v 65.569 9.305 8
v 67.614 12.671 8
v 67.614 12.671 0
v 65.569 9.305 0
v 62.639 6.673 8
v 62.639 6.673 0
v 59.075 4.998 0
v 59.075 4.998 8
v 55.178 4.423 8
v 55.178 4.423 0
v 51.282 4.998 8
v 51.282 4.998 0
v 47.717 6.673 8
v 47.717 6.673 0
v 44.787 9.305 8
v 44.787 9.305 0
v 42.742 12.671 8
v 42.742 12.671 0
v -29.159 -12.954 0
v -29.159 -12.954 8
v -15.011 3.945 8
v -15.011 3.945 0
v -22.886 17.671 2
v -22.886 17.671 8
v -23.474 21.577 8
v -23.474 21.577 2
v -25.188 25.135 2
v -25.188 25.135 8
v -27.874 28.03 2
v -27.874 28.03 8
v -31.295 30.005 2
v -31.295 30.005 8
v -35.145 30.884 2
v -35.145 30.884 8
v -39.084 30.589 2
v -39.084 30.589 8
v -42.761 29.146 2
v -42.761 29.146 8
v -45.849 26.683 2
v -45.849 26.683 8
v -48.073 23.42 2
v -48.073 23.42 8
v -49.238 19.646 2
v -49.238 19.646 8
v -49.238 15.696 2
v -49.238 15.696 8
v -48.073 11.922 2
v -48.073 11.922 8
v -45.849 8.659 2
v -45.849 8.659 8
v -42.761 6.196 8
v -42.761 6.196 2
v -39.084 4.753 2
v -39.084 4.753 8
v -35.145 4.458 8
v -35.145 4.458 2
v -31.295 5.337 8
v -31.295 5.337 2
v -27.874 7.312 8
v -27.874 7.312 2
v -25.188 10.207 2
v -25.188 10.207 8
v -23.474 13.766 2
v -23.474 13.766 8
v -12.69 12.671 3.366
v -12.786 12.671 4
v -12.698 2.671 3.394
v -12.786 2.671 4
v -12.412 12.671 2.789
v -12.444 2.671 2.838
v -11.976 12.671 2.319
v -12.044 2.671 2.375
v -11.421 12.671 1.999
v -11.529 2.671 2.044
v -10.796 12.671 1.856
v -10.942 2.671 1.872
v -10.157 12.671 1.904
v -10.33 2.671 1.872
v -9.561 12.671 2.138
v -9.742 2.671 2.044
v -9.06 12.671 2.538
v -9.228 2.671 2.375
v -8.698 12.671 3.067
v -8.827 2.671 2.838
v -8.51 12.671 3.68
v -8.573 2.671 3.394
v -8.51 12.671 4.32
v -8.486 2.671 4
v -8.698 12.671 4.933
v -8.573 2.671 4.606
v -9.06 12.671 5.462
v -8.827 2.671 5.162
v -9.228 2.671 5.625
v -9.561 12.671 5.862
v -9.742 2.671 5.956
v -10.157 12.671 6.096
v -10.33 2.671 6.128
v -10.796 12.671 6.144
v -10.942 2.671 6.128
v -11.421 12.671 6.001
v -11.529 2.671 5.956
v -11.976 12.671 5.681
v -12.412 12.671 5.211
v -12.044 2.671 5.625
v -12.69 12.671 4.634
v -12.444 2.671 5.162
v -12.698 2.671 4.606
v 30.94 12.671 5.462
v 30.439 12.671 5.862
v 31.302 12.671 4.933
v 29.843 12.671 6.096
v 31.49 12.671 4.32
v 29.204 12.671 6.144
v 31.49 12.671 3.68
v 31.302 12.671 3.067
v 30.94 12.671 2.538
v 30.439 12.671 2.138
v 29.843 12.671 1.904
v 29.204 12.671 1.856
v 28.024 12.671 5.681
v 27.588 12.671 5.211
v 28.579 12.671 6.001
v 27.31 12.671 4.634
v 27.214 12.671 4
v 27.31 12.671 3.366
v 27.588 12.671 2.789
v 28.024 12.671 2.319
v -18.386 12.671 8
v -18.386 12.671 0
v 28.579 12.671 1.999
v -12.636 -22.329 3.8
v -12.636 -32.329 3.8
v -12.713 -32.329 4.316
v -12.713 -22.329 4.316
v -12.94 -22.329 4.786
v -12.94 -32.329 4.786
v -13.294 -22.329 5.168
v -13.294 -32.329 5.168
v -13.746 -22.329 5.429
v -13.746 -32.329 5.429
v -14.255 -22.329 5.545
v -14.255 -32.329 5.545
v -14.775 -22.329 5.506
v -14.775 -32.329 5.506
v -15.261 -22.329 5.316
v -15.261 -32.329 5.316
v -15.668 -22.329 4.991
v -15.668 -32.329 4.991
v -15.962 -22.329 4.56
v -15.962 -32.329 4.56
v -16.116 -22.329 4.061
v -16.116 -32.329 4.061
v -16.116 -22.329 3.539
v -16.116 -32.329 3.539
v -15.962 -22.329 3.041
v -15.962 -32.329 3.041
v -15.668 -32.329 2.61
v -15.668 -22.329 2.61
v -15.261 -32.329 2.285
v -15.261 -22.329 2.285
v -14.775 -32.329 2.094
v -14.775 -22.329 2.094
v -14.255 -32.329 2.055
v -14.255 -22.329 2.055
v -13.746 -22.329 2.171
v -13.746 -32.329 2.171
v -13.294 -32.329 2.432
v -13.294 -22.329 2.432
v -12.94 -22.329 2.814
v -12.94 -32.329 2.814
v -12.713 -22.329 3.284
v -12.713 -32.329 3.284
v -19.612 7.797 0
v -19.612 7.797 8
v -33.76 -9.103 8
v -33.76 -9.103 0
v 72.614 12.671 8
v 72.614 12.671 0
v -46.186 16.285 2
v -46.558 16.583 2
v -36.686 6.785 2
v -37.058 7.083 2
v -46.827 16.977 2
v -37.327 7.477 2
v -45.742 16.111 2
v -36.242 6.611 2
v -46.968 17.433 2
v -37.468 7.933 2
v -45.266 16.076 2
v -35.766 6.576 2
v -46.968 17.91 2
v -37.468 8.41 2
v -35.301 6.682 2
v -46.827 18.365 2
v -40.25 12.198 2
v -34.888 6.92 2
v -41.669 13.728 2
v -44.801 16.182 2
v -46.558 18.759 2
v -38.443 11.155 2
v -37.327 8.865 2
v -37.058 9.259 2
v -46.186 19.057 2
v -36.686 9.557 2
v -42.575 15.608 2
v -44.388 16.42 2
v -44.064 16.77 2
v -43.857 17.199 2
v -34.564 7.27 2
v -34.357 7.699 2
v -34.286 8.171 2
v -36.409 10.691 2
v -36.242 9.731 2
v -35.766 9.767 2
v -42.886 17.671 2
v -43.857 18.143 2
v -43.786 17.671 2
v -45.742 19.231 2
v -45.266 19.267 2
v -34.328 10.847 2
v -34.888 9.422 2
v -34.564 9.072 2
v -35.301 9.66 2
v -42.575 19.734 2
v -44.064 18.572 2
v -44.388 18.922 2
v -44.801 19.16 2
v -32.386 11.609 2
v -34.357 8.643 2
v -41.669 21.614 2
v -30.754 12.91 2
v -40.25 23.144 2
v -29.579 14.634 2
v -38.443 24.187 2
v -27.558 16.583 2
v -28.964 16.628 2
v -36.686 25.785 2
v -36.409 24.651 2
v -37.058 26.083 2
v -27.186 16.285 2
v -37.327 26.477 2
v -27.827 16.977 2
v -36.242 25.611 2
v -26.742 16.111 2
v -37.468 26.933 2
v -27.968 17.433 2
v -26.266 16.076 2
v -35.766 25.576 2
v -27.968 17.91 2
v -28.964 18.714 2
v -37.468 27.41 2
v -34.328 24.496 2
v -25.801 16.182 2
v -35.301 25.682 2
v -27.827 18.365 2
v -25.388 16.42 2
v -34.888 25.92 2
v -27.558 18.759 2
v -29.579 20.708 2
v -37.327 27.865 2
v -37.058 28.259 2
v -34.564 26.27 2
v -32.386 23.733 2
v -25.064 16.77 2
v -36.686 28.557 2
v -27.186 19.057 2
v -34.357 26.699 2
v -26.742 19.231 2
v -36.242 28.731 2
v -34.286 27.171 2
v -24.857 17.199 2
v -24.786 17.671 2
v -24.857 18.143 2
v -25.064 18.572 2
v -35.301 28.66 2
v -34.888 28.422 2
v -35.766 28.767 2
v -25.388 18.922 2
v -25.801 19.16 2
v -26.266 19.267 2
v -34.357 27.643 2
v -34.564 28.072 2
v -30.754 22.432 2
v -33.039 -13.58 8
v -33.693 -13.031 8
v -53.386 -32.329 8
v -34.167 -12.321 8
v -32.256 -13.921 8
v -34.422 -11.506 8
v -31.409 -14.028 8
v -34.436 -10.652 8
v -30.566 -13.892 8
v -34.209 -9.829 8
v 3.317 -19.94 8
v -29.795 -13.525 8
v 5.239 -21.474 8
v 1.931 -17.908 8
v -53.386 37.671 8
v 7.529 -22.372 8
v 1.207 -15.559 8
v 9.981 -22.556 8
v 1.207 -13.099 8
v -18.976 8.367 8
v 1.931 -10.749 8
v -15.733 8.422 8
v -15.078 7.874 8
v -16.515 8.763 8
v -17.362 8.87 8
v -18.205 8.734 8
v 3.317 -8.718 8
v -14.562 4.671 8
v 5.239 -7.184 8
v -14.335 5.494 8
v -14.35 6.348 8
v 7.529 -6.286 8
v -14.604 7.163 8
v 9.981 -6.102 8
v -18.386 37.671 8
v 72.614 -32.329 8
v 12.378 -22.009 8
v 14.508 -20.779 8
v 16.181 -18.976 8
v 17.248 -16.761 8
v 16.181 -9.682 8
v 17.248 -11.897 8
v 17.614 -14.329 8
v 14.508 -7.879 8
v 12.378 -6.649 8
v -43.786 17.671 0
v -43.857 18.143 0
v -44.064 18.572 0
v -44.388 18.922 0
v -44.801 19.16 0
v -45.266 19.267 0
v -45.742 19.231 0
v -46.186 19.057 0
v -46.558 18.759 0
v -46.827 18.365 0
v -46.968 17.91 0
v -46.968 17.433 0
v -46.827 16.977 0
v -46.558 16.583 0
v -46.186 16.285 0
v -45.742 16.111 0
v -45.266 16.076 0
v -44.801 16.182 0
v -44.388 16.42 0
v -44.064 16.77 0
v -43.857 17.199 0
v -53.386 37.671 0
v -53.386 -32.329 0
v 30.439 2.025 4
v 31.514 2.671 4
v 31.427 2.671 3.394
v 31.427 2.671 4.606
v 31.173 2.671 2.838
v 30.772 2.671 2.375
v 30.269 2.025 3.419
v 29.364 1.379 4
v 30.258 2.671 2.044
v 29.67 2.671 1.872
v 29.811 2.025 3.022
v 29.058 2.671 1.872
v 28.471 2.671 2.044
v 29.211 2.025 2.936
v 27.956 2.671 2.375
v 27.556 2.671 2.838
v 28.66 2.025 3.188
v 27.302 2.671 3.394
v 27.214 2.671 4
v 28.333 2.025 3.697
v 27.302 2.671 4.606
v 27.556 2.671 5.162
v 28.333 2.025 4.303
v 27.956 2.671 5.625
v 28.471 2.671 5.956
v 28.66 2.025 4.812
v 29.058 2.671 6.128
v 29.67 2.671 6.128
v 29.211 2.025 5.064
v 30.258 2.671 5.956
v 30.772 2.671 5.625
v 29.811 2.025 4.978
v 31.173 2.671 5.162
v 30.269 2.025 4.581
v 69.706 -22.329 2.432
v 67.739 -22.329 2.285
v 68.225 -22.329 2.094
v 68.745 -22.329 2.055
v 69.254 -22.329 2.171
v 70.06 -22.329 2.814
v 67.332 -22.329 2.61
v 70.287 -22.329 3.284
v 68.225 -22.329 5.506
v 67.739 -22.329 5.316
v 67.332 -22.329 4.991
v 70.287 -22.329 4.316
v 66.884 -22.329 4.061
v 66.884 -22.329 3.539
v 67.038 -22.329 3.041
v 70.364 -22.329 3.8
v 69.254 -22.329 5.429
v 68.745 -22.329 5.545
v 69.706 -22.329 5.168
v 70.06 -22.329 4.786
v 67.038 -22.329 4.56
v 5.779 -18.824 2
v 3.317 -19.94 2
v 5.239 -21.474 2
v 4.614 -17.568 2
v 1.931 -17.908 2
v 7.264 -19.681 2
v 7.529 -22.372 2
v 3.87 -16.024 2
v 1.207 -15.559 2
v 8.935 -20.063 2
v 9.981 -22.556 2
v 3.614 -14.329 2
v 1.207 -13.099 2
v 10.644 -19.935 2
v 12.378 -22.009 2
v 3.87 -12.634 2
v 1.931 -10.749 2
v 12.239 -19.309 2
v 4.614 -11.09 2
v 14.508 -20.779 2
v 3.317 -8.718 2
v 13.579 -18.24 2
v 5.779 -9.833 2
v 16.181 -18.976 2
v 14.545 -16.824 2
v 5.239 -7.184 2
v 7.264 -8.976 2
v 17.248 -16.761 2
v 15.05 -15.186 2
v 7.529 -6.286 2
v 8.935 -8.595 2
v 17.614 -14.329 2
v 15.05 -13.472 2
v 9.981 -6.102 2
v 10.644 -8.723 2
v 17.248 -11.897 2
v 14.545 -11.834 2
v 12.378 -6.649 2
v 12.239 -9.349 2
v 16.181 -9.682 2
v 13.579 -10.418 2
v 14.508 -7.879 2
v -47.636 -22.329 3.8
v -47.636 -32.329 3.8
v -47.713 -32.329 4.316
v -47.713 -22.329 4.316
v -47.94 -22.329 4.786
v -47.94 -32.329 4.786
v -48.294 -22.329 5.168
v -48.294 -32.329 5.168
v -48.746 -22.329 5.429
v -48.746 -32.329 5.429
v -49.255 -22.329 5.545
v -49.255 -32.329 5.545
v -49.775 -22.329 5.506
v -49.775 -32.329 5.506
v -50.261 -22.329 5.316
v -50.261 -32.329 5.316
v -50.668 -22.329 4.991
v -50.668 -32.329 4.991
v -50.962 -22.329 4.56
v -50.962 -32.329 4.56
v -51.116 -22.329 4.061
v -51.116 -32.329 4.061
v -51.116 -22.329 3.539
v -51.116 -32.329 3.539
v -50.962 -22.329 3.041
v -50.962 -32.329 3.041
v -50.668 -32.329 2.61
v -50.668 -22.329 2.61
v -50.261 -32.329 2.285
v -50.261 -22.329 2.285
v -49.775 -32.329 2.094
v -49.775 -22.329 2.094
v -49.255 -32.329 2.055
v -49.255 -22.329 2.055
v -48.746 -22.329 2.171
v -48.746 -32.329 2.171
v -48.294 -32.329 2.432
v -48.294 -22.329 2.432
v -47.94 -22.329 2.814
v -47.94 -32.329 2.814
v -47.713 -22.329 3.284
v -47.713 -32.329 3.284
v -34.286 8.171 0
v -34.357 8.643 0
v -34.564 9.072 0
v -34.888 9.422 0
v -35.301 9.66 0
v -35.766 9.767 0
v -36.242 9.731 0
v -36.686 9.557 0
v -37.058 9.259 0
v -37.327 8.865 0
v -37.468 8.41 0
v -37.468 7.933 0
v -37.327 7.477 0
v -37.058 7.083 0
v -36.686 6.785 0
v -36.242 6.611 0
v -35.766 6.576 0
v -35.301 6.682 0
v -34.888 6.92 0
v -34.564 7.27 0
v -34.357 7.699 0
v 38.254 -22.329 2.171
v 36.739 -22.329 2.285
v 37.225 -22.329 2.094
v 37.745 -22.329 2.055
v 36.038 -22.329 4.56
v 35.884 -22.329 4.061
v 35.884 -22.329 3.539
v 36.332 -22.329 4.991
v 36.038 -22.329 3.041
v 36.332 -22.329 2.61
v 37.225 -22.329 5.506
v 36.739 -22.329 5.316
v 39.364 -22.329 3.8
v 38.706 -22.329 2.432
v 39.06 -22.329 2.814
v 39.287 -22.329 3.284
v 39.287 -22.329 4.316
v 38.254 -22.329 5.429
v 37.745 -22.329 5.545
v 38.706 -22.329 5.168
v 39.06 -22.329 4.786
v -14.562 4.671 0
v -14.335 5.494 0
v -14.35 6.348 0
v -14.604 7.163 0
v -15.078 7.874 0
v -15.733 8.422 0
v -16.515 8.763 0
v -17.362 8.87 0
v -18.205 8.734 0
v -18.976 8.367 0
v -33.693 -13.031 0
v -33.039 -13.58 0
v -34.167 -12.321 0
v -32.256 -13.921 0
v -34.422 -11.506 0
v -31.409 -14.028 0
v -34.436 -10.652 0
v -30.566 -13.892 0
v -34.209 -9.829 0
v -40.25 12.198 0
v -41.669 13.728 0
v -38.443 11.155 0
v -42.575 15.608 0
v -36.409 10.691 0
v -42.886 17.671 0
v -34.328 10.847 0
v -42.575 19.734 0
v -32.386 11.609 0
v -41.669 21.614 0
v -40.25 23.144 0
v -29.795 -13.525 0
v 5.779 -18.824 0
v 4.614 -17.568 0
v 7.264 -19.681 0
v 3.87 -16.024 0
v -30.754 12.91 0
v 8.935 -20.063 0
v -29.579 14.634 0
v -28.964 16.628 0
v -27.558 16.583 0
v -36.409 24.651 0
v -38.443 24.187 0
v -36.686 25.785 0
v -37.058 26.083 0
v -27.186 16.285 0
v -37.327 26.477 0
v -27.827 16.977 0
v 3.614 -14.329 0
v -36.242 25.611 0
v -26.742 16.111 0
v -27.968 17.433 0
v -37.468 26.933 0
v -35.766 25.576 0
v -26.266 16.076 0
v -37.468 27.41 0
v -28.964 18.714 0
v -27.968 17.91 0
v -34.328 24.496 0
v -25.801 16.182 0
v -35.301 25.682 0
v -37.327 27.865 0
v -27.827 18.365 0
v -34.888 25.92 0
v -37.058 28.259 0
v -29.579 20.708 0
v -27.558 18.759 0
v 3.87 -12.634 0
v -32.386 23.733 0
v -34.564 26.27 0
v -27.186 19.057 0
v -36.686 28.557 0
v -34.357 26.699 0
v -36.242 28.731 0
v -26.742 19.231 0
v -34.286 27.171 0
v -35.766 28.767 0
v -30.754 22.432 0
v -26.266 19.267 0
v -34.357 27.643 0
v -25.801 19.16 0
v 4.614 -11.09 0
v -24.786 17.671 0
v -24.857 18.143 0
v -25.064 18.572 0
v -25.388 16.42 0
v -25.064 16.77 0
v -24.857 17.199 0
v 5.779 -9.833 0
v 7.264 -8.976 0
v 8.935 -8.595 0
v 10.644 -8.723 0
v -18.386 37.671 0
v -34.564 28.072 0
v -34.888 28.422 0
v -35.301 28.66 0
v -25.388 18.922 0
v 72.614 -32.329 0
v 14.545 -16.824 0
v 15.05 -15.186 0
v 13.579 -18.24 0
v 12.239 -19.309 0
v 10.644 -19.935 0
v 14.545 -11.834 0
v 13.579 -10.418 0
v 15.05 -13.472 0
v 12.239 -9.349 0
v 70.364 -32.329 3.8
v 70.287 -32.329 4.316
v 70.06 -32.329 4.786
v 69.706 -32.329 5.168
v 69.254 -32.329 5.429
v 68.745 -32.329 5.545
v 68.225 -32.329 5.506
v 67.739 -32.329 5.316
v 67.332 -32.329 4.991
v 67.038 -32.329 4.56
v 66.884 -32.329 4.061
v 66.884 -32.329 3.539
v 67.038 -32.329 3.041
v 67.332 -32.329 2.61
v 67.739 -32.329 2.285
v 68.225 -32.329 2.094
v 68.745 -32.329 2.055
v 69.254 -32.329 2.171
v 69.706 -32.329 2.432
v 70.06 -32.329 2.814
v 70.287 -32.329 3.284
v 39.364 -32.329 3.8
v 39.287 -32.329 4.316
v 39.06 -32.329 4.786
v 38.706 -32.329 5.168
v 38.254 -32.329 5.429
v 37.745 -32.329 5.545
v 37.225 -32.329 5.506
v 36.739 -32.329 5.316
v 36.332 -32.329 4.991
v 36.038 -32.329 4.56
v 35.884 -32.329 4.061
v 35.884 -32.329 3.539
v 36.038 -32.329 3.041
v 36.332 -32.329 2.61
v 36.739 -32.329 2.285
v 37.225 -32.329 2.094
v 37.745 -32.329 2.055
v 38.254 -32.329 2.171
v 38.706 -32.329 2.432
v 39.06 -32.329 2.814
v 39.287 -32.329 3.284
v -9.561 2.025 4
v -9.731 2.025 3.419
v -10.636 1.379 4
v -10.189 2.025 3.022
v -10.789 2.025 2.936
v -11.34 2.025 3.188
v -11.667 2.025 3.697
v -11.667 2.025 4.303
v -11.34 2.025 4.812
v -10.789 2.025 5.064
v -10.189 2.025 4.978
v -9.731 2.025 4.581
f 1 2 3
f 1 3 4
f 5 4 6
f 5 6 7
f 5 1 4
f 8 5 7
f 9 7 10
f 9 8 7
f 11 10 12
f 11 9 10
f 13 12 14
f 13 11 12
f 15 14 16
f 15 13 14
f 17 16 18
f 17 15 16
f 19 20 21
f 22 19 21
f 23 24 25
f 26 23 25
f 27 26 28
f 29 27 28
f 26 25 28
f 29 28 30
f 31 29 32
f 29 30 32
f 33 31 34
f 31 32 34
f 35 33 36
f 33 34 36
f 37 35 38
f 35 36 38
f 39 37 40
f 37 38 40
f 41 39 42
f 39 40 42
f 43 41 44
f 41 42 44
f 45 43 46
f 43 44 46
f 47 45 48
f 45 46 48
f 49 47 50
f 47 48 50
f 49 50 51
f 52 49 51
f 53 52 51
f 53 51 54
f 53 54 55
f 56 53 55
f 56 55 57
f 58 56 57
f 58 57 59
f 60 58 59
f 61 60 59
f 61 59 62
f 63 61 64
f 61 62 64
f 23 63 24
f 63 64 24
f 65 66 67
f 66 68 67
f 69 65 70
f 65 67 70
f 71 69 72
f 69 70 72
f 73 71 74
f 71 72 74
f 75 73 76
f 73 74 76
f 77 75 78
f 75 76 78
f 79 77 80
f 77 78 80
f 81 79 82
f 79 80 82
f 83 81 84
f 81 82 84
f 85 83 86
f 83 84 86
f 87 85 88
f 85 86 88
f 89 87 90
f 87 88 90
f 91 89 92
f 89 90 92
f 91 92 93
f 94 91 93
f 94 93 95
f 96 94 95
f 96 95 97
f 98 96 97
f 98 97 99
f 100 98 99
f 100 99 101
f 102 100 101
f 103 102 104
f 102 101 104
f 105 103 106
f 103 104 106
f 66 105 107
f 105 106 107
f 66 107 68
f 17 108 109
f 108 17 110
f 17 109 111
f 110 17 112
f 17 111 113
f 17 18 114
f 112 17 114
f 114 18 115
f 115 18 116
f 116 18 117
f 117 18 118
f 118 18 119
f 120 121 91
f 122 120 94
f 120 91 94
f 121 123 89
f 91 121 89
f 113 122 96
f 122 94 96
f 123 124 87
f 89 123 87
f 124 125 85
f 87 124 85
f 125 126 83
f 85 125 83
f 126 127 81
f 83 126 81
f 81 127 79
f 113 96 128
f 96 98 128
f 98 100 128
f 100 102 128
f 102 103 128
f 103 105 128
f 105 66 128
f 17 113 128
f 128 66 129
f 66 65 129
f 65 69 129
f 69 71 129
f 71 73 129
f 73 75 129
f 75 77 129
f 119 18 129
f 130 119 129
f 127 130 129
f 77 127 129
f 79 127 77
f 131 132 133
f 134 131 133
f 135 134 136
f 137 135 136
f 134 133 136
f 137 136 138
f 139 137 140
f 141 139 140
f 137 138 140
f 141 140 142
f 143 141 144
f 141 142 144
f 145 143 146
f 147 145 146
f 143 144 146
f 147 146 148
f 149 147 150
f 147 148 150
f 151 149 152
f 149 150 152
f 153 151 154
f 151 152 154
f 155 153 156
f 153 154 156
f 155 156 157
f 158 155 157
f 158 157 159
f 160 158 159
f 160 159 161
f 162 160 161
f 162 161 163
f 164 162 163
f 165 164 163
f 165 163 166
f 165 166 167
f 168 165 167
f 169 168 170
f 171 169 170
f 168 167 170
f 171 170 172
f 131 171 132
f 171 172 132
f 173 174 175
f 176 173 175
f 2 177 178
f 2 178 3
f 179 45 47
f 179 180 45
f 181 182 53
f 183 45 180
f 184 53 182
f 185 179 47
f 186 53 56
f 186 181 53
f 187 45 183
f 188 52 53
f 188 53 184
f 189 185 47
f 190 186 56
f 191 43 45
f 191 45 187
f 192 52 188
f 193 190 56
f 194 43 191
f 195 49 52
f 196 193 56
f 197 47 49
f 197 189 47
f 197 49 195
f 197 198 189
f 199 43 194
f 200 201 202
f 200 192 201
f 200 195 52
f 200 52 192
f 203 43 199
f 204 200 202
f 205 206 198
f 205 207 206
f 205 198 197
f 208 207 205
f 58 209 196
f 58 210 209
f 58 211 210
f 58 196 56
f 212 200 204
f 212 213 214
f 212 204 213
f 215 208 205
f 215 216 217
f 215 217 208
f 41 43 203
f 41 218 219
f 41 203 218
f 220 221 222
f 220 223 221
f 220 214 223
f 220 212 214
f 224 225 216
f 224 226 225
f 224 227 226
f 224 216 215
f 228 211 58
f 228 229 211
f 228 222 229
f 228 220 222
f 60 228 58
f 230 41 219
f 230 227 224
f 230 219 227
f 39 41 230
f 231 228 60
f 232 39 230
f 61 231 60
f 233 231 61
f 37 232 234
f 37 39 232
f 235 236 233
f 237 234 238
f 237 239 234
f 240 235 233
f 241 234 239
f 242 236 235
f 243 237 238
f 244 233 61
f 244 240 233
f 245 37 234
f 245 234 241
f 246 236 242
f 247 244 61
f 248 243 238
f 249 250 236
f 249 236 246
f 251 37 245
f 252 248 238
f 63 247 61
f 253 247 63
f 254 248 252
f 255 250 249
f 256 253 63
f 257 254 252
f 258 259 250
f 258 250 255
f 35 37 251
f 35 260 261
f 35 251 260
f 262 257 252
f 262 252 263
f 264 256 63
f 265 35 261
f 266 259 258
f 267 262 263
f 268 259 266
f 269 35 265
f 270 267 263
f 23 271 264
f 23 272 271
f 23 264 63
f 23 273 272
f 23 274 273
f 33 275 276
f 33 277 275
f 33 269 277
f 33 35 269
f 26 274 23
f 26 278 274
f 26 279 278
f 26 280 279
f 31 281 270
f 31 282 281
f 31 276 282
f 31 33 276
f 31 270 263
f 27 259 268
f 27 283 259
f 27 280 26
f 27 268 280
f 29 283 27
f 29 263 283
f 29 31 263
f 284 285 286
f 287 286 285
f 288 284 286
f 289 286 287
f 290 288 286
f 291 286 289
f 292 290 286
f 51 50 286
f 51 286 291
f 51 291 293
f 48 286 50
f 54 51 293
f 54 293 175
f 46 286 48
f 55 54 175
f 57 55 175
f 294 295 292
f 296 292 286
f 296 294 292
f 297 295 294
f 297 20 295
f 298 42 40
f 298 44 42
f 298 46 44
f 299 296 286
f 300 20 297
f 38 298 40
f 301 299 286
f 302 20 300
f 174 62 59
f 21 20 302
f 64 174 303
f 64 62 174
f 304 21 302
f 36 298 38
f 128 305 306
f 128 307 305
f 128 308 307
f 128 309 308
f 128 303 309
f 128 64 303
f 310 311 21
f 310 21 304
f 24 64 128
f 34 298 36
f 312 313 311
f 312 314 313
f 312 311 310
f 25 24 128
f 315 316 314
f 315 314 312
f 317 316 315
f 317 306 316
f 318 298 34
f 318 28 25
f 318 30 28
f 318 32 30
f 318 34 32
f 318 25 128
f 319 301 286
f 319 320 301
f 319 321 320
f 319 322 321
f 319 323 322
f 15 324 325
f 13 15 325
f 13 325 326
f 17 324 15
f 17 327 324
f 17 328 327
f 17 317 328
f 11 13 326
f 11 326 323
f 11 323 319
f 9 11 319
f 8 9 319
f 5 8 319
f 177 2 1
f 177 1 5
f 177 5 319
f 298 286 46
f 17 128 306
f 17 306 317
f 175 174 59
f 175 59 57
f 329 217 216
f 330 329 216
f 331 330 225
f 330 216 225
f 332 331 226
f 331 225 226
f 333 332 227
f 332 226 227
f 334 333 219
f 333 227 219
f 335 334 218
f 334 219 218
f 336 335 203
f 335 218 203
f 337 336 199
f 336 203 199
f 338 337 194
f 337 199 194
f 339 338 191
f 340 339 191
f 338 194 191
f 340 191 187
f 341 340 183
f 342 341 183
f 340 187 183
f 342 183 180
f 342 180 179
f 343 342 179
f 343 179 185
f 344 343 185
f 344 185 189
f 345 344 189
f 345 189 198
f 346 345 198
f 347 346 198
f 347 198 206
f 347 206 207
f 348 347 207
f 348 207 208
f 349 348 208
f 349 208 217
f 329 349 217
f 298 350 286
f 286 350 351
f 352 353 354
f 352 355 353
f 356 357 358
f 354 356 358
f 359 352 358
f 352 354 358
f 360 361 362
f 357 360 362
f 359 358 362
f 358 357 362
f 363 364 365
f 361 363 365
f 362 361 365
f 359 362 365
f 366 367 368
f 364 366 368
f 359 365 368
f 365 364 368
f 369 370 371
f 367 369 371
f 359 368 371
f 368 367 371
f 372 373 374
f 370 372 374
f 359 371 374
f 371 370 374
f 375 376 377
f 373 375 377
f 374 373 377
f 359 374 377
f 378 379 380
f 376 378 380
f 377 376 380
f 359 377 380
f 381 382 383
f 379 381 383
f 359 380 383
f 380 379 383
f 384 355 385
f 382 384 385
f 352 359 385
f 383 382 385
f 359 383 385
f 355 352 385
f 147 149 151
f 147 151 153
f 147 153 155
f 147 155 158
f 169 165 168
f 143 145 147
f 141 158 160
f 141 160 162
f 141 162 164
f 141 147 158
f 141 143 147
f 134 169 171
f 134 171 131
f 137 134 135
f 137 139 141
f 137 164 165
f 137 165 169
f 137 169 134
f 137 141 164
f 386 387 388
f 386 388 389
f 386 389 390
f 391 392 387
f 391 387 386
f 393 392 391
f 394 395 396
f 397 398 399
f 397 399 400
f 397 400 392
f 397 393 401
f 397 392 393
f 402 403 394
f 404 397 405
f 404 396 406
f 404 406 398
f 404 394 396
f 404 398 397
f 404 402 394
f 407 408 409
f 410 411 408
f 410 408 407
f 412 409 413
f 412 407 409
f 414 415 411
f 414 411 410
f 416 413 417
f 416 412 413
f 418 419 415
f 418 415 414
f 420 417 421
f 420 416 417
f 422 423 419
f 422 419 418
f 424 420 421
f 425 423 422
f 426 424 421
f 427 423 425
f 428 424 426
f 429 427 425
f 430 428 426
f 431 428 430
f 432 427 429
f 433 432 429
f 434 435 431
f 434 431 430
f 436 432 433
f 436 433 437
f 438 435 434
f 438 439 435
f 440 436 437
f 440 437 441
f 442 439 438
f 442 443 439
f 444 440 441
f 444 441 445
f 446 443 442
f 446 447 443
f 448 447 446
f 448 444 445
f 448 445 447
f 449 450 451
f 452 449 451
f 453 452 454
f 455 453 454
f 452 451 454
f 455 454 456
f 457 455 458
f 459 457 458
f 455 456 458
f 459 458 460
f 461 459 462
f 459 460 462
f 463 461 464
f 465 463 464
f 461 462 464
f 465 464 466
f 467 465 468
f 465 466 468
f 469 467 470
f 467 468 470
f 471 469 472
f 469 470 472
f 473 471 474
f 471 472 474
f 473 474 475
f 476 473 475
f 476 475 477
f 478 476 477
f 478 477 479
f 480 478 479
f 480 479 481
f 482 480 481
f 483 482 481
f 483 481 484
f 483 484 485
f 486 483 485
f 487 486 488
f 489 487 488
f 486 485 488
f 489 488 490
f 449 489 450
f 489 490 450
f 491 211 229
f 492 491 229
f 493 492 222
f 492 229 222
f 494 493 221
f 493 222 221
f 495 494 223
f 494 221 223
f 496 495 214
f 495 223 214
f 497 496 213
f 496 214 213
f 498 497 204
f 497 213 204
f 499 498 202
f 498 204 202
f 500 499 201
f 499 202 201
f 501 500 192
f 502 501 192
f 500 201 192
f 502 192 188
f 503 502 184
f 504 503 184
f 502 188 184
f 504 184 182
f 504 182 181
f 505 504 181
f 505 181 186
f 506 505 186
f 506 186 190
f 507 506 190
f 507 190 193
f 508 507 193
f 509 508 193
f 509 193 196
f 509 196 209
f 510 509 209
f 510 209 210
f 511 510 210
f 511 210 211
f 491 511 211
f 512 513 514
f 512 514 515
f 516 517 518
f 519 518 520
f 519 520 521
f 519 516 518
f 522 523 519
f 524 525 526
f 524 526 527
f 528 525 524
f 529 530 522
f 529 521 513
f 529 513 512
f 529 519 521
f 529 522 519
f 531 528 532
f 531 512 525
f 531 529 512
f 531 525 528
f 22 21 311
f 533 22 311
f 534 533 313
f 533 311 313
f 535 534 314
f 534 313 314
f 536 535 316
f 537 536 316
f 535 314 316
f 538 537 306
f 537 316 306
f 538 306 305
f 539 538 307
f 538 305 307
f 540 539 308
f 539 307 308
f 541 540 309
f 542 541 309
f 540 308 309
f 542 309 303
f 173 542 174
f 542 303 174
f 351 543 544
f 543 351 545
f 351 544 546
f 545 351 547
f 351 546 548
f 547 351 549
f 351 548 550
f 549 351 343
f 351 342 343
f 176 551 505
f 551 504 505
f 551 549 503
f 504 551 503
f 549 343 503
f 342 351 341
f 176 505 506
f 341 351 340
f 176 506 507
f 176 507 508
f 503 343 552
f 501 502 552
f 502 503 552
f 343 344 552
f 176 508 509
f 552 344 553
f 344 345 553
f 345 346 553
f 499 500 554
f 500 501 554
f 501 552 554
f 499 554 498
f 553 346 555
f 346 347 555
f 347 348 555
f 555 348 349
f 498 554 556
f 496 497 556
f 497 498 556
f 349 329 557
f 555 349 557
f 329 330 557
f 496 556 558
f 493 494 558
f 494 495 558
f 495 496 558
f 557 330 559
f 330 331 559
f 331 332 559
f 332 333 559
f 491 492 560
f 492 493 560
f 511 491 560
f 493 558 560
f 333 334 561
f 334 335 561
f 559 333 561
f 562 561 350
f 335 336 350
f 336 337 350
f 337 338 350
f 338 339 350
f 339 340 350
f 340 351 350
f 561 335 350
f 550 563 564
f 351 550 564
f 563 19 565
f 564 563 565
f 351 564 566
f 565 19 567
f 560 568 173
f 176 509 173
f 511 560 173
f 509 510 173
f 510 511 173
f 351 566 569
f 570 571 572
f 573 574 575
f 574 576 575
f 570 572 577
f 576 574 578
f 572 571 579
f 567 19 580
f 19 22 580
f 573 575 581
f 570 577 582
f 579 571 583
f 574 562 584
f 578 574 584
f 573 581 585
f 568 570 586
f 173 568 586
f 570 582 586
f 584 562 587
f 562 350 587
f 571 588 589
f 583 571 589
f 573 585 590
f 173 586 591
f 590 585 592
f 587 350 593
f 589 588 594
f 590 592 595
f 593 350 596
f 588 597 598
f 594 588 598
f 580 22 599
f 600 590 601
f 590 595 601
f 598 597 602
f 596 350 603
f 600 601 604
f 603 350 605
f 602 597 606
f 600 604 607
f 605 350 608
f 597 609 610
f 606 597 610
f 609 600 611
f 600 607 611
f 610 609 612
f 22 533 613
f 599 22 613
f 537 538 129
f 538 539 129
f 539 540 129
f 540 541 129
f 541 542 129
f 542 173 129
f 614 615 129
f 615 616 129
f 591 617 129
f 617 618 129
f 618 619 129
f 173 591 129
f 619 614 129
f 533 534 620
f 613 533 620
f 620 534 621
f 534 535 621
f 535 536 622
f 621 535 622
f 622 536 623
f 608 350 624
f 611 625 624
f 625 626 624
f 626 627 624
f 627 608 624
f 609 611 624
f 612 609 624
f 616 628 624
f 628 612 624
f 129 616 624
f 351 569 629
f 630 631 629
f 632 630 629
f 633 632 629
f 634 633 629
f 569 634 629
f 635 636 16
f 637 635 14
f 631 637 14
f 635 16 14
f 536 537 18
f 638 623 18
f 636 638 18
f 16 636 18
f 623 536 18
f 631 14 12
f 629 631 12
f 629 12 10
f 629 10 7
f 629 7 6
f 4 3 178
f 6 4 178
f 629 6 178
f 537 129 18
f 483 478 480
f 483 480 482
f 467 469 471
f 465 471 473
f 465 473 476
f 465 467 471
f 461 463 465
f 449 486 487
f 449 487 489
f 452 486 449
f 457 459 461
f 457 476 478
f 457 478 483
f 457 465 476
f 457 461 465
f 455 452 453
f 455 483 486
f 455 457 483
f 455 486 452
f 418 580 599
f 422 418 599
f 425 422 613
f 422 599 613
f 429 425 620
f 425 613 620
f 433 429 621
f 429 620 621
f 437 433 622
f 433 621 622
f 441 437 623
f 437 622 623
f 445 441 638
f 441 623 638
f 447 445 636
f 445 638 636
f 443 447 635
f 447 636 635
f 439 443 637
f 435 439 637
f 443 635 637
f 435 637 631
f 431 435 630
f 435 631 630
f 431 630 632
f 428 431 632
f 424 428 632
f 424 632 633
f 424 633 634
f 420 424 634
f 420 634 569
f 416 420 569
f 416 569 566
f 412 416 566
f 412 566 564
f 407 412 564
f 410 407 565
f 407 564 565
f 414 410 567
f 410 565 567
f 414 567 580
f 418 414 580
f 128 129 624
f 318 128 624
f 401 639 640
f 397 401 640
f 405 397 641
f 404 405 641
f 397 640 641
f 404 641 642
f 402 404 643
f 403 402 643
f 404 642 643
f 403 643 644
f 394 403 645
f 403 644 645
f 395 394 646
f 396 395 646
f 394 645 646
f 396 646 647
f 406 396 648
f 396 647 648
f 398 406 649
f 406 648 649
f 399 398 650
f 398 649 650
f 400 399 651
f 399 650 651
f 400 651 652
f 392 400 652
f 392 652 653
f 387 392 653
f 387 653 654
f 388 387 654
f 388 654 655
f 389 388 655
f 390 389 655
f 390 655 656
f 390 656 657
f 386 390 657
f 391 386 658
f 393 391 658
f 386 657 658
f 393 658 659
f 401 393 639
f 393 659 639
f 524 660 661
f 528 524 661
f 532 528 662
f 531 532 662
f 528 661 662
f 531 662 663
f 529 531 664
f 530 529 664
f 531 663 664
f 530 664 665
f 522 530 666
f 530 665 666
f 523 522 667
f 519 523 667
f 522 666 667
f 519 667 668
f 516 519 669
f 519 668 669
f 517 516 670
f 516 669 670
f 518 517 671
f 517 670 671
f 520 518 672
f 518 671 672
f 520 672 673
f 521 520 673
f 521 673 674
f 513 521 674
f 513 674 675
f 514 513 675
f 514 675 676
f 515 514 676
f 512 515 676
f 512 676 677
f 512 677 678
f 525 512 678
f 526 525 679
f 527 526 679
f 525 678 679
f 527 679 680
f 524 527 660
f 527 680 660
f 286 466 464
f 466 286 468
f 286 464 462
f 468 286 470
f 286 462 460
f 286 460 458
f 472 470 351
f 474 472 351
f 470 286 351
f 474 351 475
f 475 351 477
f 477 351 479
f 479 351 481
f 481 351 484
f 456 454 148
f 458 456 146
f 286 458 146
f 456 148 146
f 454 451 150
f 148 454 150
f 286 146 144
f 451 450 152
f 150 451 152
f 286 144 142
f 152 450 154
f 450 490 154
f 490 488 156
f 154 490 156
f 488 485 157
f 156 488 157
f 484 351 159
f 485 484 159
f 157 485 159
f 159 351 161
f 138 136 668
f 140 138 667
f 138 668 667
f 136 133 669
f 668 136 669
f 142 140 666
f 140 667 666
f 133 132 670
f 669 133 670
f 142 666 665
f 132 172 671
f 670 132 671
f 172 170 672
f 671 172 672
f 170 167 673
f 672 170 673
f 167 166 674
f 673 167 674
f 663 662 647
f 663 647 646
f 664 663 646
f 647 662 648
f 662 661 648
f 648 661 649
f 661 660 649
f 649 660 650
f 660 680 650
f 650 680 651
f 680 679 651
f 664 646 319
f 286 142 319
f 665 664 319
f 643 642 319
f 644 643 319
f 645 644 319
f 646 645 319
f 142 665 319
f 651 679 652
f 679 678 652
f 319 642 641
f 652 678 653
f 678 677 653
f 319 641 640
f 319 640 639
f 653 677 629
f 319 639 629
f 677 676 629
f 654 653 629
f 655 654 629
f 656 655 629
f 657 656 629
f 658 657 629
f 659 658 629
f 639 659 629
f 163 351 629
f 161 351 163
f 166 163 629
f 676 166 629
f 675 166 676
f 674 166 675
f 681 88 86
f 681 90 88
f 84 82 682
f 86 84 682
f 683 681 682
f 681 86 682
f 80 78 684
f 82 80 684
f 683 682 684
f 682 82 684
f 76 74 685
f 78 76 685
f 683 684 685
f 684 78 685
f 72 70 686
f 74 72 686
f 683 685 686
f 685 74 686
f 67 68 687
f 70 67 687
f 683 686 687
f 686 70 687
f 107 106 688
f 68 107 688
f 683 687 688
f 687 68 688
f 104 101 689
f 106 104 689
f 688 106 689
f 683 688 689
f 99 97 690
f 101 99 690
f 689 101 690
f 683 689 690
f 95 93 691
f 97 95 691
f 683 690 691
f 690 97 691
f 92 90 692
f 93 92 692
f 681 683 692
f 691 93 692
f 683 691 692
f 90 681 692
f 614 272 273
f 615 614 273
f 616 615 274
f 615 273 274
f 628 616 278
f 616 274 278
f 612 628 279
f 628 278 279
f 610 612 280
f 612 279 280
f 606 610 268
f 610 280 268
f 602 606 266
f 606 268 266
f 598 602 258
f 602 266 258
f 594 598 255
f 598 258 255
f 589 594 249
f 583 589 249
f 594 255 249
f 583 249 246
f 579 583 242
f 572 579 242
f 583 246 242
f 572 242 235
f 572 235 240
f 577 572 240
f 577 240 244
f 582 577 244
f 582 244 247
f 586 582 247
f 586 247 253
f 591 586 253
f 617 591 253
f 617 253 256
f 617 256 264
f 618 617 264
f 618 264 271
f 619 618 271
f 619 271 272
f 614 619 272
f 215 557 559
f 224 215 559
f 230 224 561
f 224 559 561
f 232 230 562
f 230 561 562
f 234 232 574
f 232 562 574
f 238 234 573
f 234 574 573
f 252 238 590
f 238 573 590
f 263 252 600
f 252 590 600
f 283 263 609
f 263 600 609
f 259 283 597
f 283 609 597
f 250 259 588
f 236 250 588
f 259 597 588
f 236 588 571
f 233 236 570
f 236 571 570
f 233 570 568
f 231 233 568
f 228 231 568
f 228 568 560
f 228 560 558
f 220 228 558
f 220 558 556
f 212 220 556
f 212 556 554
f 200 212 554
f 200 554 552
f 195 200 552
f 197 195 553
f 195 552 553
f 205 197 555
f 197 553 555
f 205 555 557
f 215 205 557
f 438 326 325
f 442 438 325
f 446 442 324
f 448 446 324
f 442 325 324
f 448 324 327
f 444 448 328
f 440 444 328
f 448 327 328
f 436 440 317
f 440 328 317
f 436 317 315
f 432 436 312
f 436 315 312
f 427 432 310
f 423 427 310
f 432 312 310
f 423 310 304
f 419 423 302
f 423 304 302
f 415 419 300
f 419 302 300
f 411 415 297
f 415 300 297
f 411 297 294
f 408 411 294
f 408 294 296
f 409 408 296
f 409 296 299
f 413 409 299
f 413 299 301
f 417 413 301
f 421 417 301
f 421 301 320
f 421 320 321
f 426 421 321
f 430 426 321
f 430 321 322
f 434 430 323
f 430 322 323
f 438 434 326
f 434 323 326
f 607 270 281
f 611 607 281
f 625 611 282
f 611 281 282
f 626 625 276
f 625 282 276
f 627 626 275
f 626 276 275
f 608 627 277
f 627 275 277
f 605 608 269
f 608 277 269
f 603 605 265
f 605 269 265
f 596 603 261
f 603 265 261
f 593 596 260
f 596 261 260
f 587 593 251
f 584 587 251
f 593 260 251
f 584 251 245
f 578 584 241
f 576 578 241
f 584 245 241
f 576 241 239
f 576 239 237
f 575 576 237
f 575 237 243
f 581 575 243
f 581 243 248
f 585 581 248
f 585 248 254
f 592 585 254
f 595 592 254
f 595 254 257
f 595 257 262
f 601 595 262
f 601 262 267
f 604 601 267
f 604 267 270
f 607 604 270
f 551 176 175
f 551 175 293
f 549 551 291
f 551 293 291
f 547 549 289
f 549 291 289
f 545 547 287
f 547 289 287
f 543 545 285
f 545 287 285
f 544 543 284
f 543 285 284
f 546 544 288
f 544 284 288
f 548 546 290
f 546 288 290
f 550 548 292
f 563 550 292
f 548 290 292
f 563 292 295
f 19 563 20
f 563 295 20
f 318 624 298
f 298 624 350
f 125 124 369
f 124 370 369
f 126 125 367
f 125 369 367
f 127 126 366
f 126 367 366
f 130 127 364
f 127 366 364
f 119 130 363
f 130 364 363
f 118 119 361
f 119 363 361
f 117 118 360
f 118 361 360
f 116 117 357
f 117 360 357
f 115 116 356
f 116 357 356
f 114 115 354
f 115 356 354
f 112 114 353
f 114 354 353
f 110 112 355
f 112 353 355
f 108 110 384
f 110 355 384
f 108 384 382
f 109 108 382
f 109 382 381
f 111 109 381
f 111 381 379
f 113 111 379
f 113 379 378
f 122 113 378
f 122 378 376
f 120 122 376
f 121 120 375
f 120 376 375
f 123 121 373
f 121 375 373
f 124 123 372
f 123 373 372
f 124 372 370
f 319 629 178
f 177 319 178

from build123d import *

# Parameters (mm, degrees)
BOSS_EXTRU_1_DEPTH       = 8
REPOSE_MOTEUR_DEPTH      = 8
ESQUISSE5_R              = 8.25
FIXATION_COURROI_1_DEPTH = 6
ESQUISSE6_R              = 5.75
FIXATION_COURROI_2_DEPTH = 2
ESQUISSE3_R              = 7
FIXATION_MOTEUR_1_DEPTH  = 2
ESQUISSE2_R              = 13.25
FIXATION_MOTEUR_2_DEPTH  = 6
D_GAGEMENT_M31_D         = 3.2
D_GAGEMENT_M31_DEPTH     = 10
D_GAGEMENT_M31_TIP       = 0.96137699
D_GAGEMENT_M41_D         = 4.3
D_GAGEMENT_M41_DEPTH     = 10
D_GAGEMENT_M41_TIP       = 1.291850331
ESQUISSE7_R              = 1.75
ENL_V_MAT_EXTRU_1_DEPTH  = 10


with BuildPart() as part:
    # Esquisse1 → Boss.-Extru.1 (new body)
    with BuildSketch(Plane.XY):
        Polygon((-53.385579659, 37.671052632), (-53.385579659, -32.328947368), (72.614420341, -32.328947368), (72.614420341, 12.671052632), (-18.385579659, 12.671052632), (-18.385579659, 37.671052632), align=None)
    extrude(amount=BOSS_EXTRU_1_DEPTH)

    # Esquisse4 → Repose moteur (cut)
    with BuildSketch(Plane.XY.offset(8)):
        with BuildLine():
            Line((42.741726231, 12.671052632), (67.614420341, 12.671052632))
            ThreePointArc((67.614420341, 12.671052632), (55.178073286, 4.423411332), (42.741726231, 12.671052632))
        make_face()
        with BuildLine():
            Line((-19.611662647, 7.796589582), (-33.760042708, -9.10286438))
            ThreePointArc((-33.760042708, -9.10286438), (-33.385579659, -13.328947368), (-29.15949667, -12.954484319))
            Line((-29.15949667, -12.954484319), (-15.011116609, 3.944969643))
            ThreePointArc((-15.011116609, 3.944969643), (-15.385579659, 8.171052632), (-19.611662647, 7.796589582))
        make_face()
    extrude(amount=-REPOSE_MOTEUR_DEPTH, mode=Mode.SUBTRACT)

    # Esquisse5 → Fixation courroi 1 (cut)
    with BuildSketch(Plane.XY.offset(8)):
        with Locations((9.364420341, -14.328947368)):
            Circle(ESQUISSE5_R)
    extrude(amount=-FIXATION_COURROI_1_DEPTH, mode=Mode.SUBTRACT)

    # Esquisse6 → Fixation courroi 2 (cut)
    with BuildSketch(Plane(origin=(0, 0, 0), x_dir=(-1, 0, 0), z_dir=(0, 0, -1))):
        with Locations((-9.364420341, -14.328947368)):
            Circle(ESQUISSE6_R)
    extrude(amount=-FIXATION_COURROI_2_DEPTH, mode=Mode.SUBTRACT)

    # Esquisse3 → Fixation moteur 1 (cut)
    with BuildSketch(Plane(origin=(0, 0, 0), x_dir=(-1, 0, 0), z_dir=(0, 0, -1))):
        with Locations((35.885579659, 17.671052632)):
            Circle(ESQUISSE3_R)
    extrude(amount=-FIXATION_MOTEUR_1_DEPTH, mode=Mode.SUBTRACT)

    # Esquisse2 → Fixation moteur 2 (cut)
    with BuildSketch(Plane.XY.offset(8)):
        with Locations((-36.135579659, 17.671052632)):
            Circle(ESQUISSE2_R)
    extrude(amount=-FIXATION_MOTEUR_2_DEPTH, mode=Mode.SUBTRACT)

    # Dégagement M31
    with Locations(Plane(origin=(-26.385579659, 17.671052632, 0), x_dir=(-1, 0, 0), z_dir=(0, 0, -1))):
        with Locations((0, 0), (9.5, 9.5), (19, 0), (9.5, -9.5)):
            Hole(D_GAGEMENT_M31_D / 2, depth=D_GAGEMENT_M31_DEPTH)
            with Locations((0, 0, -(D_GAGEMENT_M31_DEPTH + D_GAGEMENT_M31_TIP / 2))):  # 118° drill point
                Cone(0, D_GAGEMENT_M31_D / 2, D_GAGEMENT_M31_TIP, mode=Mode.SUBTRACT)

    # Dégagement M41
    with Locations(Plane(origin=(-10.635579659, 12.671052632, 4), x_dir=(1, 0, 0), z_dir=(0, 1, 0))):
        with Locations((0, 0), (40, 0)):
            Hole(D_GAGEMENT_M41_D / 2, depth=D_GAGEMENT_M41_DEPTH)
            with Locations((0, 0, -(D_GAGEMENT_M41_DEPTH + D_GAGEMENT_M41_TIP / 2))):  # 118° drill point
                Cone(0, D_GAGEMENT_M41_D / 2, D_GAGEMENT_M41_TIP, mode=Mode.SUBTRACT)

    # Esquisse7 → Enlèv. mat.-Extru.1 (cut)
    with BuildSketch(Plane.XZ.offset(32.328947368)):
        with Locations((-49.385579659, 3.800276617)):
            Circle(ESQUISSE7_R)
        with Locations((-14.385579659, 3.800276617)):
            Circle(ESQUISSE7_R)
        with Locations((37.614420341, 3.800276617)):
            Circle(ESQUISSE7_R)
        with Locations((68.614420341, 3.800276617)):
            Circle(ESQUISSE7_R)
    extrude(amount=-ENL_V_MAT_EXTRU_1_DEPTH, mode=Mode.SUBTRACT)


solid = part.part
